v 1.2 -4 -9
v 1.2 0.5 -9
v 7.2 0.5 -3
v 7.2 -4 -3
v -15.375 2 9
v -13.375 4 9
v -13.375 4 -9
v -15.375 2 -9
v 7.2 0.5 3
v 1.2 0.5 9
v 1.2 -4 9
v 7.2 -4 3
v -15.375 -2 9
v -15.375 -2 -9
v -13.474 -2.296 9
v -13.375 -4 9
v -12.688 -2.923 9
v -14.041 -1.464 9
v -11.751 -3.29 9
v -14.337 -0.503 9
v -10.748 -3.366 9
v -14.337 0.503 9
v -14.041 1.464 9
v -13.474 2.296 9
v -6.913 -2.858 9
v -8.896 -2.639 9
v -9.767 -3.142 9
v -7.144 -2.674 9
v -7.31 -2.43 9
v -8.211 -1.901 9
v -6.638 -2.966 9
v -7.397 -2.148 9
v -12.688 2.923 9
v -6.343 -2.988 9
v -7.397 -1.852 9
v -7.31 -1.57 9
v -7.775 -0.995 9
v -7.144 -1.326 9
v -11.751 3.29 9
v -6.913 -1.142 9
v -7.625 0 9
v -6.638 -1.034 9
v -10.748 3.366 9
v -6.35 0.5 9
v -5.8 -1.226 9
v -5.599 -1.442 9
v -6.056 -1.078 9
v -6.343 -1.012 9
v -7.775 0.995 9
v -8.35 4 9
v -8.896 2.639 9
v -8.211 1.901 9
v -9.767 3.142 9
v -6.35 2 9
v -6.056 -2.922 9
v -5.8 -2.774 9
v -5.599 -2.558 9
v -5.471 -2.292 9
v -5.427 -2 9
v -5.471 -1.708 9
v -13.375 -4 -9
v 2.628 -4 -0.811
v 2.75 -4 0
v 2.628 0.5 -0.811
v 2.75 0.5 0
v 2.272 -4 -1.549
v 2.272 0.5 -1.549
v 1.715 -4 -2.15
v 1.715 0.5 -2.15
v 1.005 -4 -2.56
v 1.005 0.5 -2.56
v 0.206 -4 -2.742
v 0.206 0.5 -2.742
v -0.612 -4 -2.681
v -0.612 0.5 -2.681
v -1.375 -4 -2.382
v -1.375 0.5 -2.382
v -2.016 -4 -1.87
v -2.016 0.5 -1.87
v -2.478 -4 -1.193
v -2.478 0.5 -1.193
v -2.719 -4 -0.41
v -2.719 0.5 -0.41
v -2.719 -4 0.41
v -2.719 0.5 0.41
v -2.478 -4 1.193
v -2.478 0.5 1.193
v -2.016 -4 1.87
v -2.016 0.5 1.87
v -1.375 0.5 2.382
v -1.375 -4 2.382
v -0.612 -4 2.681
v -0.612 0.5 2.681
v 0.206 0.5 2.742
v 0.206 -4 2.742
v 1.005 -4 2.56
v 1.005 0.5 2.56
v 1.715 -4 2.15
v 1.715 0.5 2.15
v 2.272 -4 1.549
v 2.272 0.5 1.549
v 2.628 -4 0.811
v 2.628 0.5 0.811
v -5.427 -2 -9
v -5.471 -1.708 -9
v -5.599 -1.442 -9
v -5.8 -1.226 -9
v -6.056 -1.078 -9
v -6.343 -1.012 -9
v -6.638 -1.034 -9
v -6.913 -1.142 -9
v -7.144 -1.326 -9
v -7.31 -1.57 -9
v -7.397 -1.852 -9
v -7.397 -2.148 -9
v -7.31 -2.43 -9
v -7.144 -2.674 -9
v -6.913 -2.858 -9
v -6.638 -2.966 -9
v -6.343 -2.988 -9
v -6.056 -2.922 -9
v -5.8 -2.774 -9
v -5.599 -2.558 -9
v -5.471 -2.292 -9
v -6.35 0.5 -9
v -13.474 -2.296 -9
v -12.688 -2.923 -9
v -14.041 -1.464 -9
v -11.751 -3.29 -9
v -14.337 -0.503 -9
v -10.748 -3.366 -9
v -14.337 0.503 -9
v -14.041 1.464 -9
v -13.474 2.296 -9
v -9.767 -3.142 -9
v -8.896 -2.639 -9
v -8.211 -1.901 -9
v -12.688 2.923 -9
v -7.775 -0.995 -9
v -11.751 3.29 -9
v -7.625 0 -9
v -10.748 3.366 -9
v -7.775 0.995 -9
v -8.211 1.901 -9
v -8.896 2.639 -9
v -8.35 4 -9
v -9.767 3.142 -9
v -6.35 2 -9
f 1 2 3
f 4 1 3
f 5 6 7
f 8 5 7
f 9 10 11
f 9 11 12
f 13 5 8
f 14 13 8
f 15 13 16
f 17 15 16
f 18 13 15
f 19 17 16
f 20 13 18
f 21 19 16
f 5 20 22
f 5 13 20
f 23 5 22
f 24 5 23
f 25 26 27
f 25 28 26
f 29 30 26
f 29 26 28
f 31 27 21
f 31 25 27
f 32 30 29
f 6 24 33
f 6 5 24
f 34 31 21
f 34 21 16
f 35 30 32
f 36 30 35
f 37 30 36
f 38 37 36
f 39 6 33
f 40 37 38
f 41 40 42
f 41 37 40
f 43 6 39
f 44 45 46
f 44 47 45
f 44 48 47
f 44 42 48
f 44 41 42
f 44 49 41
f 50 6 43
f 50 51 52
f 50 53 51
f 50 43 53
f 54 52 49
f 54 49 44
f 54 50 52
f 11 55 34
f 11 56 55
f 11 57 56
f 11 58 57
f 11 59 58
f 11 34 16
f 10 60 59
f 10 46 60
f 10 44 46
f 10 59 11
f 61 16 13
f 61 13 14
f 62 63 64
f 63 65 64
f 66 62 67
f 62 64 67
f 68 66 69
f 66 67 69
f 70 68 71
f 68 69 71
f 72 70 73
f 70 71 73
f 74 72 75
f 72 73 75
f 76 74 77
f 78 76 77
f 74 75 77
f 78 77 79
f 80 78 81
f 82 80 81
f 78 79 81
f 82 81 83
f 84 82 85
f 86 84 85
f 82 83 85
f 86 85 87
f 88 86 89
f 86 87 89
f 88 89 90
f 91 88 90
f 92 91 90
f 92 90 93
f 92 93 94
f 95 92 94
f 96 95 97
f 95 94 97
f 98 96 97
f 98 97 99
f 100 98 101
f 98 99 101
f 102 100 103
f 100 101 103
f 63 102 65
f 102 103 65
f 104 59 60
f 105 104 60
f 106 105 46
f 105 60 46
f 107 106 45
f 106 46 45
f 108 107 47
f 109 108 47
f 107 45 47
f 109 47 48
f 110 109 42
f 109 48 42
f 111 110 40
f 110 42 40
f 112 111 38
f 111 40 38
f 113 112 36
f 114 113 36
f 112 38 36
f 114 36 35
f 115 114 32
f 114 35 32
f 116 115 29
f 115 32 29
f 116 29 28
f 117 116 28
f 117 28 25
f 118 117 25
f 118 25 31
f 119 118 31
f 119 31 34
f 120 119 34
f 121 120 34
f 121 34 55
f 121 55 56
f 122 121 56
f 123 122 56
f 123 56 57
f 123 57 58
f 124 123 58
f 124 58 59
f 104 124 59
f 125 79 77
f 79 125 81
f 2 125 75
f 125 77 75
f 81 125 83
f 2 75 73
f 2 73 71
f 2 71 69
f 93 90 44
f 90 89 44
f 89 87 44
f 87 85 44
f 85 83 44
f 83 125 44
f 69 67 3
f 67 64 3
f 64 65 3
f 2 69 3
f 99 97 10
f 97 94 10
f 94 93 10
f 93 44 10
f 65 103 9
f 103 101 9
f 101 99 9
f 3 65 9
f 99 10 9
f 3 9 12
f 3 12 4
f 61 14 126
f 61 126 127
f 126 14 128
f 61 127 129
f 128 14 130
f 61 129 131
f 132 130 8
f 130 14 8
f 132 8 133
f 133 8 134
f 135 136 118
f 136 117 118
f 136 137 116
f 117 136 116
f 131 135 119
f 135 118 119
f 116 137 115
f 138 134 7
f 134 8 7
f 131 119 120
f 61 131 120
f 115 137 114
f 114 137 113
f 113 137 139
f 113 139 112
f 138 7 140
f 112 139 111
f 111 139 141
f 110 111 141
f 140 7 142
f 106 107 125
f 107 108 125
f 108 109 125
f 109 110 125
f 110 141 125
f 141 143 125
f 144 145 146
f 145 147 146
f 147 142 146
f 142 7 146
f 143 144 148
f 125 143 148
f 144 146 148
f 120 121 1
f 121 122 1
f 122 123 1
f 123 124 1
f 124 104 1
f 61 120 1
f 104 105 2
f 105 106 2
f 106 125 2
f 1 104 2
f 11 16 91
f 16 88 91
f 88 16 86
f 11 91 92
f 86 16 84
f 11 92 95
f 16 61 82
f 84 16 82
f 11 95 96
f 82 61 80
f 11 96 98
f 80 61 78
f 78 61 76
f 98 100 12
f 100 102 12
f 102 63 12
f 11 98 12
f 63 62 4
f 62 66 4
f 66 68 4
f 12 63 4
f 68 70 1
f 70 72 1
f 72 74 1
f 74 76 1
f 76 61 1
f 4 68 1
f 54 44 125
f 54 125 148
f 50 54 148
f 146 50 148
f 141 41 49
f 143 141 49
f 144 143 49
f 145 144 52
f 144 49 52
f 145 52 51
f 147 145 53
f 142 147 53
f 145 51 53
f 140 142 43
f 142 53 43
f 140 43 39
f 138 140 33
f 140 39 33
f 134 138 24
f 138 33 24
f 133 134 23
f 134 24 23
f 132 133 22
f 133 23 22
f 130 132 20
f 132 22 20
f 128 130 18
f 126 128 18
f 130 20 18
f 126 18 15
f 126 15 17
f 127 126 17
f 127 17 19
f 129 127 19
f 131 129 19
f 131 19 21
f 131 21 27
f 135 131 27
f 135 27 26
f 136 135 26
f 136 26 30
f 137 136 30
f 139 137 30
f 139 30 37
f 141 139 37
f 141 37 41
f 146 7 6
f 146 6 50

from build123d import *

# Parameters (mm, degrees)
BOSS_EXTRUDE1_DEPTH      = 4
BOSS_EXTRUDE1_DEPTH_BACK = 4
SKETCH1_W                = 22.575
SKETCH1_H                = 18
SKETCH1_R                = 2.75
SKETCH3_R                = 3.375
SKETCH3_R_2              = 0.9905
CUT_EXTRUDE1_DEPTH       = 25.008136642
SKETCH4_W                = 13.55
SKETCH4_H                = 3.5
CUT_EXTRUDE2_DEPTH       = 25.008136642
CUT_EXTRUDE3_DEPTH       = 19.375
CHAMFER1_SIZE            = 2


with BuildPart() as part:
    # Sketch1 → Boss-Extrude1 (new, two sides: drawn at the far end of the back side and taken through both)
    with BuildSketch(Plane(origin=(0, 0, 0), x_dir=(1, 0, 0), z_dir=(0, 1, 0)).offset(-BOSS_EXTRUDE1_DEPTH_BACK)):
        with Locations((-4.0875, 0)):
            Rectangle(SKETCH1_W, SKETCH1_H)
        Circle(SKETCH1_R, mode=Mode.SUBTRACT)
    extrude(amount=BOSS_EXTRUDE1_DEPTH + BOSS_EXTRUDE1_DEPTH_BACK)

    # Sketch3 → Cut-Extrude1 (cut, through all)
    with BuildSketch(Plane.XY.offset(9)):
        with Locations((-11, 0)):
            Circle(SKETCH3_R)
        with Locations((-6.417424305, -2)):
            Circle(SKETCH3_R_2)
    extrude(amount=-CUT_EXTRUDE1_DEPTH, mode=Mode.SUBTRACT)

    # Sketch4 → Cut-Extrude2 (cut, through all)
    with BuildSketch(Plane.XY.offset(9)):
        with Locations((0.425, 2.25)):
            Rectangle(SKETCH4_W, SKETCH4_H)
    extrude(amount=-CUT_EXTRUDE2_DEPTH, mode=Mode.SUBTRACT)

    # Sketch5 → Cut-Extrude3 (cut, through all)
    with BuildSketch(Plane(origin=(0, 0.5, 0), x_dir=(-1, 0, 0), z_dir=(0, 1, 0))):
        Polygon((-1.2, -9), (-7.2, -3), (-7.2, -9), align=None)
        Polygon((-1.2, 9), (-7.2, 3), (-7.2, 9), align=None)
    extrude(amount=-CUT_EXTRUDE3_DEPTH, mode=Mode.SUBTRACT)

    # Chamfer1
    chamfer1_edges = [part.edges().sort_by_distance(p)[0] for p in [
        (-15.375, -4, 0),
        (-15.375, 4, 0),
        (-6.35, 4, 0),
    ]]
    chamfer(chamfer1_edges, length=CHAMFER1_SIZE)


solid = part.part
